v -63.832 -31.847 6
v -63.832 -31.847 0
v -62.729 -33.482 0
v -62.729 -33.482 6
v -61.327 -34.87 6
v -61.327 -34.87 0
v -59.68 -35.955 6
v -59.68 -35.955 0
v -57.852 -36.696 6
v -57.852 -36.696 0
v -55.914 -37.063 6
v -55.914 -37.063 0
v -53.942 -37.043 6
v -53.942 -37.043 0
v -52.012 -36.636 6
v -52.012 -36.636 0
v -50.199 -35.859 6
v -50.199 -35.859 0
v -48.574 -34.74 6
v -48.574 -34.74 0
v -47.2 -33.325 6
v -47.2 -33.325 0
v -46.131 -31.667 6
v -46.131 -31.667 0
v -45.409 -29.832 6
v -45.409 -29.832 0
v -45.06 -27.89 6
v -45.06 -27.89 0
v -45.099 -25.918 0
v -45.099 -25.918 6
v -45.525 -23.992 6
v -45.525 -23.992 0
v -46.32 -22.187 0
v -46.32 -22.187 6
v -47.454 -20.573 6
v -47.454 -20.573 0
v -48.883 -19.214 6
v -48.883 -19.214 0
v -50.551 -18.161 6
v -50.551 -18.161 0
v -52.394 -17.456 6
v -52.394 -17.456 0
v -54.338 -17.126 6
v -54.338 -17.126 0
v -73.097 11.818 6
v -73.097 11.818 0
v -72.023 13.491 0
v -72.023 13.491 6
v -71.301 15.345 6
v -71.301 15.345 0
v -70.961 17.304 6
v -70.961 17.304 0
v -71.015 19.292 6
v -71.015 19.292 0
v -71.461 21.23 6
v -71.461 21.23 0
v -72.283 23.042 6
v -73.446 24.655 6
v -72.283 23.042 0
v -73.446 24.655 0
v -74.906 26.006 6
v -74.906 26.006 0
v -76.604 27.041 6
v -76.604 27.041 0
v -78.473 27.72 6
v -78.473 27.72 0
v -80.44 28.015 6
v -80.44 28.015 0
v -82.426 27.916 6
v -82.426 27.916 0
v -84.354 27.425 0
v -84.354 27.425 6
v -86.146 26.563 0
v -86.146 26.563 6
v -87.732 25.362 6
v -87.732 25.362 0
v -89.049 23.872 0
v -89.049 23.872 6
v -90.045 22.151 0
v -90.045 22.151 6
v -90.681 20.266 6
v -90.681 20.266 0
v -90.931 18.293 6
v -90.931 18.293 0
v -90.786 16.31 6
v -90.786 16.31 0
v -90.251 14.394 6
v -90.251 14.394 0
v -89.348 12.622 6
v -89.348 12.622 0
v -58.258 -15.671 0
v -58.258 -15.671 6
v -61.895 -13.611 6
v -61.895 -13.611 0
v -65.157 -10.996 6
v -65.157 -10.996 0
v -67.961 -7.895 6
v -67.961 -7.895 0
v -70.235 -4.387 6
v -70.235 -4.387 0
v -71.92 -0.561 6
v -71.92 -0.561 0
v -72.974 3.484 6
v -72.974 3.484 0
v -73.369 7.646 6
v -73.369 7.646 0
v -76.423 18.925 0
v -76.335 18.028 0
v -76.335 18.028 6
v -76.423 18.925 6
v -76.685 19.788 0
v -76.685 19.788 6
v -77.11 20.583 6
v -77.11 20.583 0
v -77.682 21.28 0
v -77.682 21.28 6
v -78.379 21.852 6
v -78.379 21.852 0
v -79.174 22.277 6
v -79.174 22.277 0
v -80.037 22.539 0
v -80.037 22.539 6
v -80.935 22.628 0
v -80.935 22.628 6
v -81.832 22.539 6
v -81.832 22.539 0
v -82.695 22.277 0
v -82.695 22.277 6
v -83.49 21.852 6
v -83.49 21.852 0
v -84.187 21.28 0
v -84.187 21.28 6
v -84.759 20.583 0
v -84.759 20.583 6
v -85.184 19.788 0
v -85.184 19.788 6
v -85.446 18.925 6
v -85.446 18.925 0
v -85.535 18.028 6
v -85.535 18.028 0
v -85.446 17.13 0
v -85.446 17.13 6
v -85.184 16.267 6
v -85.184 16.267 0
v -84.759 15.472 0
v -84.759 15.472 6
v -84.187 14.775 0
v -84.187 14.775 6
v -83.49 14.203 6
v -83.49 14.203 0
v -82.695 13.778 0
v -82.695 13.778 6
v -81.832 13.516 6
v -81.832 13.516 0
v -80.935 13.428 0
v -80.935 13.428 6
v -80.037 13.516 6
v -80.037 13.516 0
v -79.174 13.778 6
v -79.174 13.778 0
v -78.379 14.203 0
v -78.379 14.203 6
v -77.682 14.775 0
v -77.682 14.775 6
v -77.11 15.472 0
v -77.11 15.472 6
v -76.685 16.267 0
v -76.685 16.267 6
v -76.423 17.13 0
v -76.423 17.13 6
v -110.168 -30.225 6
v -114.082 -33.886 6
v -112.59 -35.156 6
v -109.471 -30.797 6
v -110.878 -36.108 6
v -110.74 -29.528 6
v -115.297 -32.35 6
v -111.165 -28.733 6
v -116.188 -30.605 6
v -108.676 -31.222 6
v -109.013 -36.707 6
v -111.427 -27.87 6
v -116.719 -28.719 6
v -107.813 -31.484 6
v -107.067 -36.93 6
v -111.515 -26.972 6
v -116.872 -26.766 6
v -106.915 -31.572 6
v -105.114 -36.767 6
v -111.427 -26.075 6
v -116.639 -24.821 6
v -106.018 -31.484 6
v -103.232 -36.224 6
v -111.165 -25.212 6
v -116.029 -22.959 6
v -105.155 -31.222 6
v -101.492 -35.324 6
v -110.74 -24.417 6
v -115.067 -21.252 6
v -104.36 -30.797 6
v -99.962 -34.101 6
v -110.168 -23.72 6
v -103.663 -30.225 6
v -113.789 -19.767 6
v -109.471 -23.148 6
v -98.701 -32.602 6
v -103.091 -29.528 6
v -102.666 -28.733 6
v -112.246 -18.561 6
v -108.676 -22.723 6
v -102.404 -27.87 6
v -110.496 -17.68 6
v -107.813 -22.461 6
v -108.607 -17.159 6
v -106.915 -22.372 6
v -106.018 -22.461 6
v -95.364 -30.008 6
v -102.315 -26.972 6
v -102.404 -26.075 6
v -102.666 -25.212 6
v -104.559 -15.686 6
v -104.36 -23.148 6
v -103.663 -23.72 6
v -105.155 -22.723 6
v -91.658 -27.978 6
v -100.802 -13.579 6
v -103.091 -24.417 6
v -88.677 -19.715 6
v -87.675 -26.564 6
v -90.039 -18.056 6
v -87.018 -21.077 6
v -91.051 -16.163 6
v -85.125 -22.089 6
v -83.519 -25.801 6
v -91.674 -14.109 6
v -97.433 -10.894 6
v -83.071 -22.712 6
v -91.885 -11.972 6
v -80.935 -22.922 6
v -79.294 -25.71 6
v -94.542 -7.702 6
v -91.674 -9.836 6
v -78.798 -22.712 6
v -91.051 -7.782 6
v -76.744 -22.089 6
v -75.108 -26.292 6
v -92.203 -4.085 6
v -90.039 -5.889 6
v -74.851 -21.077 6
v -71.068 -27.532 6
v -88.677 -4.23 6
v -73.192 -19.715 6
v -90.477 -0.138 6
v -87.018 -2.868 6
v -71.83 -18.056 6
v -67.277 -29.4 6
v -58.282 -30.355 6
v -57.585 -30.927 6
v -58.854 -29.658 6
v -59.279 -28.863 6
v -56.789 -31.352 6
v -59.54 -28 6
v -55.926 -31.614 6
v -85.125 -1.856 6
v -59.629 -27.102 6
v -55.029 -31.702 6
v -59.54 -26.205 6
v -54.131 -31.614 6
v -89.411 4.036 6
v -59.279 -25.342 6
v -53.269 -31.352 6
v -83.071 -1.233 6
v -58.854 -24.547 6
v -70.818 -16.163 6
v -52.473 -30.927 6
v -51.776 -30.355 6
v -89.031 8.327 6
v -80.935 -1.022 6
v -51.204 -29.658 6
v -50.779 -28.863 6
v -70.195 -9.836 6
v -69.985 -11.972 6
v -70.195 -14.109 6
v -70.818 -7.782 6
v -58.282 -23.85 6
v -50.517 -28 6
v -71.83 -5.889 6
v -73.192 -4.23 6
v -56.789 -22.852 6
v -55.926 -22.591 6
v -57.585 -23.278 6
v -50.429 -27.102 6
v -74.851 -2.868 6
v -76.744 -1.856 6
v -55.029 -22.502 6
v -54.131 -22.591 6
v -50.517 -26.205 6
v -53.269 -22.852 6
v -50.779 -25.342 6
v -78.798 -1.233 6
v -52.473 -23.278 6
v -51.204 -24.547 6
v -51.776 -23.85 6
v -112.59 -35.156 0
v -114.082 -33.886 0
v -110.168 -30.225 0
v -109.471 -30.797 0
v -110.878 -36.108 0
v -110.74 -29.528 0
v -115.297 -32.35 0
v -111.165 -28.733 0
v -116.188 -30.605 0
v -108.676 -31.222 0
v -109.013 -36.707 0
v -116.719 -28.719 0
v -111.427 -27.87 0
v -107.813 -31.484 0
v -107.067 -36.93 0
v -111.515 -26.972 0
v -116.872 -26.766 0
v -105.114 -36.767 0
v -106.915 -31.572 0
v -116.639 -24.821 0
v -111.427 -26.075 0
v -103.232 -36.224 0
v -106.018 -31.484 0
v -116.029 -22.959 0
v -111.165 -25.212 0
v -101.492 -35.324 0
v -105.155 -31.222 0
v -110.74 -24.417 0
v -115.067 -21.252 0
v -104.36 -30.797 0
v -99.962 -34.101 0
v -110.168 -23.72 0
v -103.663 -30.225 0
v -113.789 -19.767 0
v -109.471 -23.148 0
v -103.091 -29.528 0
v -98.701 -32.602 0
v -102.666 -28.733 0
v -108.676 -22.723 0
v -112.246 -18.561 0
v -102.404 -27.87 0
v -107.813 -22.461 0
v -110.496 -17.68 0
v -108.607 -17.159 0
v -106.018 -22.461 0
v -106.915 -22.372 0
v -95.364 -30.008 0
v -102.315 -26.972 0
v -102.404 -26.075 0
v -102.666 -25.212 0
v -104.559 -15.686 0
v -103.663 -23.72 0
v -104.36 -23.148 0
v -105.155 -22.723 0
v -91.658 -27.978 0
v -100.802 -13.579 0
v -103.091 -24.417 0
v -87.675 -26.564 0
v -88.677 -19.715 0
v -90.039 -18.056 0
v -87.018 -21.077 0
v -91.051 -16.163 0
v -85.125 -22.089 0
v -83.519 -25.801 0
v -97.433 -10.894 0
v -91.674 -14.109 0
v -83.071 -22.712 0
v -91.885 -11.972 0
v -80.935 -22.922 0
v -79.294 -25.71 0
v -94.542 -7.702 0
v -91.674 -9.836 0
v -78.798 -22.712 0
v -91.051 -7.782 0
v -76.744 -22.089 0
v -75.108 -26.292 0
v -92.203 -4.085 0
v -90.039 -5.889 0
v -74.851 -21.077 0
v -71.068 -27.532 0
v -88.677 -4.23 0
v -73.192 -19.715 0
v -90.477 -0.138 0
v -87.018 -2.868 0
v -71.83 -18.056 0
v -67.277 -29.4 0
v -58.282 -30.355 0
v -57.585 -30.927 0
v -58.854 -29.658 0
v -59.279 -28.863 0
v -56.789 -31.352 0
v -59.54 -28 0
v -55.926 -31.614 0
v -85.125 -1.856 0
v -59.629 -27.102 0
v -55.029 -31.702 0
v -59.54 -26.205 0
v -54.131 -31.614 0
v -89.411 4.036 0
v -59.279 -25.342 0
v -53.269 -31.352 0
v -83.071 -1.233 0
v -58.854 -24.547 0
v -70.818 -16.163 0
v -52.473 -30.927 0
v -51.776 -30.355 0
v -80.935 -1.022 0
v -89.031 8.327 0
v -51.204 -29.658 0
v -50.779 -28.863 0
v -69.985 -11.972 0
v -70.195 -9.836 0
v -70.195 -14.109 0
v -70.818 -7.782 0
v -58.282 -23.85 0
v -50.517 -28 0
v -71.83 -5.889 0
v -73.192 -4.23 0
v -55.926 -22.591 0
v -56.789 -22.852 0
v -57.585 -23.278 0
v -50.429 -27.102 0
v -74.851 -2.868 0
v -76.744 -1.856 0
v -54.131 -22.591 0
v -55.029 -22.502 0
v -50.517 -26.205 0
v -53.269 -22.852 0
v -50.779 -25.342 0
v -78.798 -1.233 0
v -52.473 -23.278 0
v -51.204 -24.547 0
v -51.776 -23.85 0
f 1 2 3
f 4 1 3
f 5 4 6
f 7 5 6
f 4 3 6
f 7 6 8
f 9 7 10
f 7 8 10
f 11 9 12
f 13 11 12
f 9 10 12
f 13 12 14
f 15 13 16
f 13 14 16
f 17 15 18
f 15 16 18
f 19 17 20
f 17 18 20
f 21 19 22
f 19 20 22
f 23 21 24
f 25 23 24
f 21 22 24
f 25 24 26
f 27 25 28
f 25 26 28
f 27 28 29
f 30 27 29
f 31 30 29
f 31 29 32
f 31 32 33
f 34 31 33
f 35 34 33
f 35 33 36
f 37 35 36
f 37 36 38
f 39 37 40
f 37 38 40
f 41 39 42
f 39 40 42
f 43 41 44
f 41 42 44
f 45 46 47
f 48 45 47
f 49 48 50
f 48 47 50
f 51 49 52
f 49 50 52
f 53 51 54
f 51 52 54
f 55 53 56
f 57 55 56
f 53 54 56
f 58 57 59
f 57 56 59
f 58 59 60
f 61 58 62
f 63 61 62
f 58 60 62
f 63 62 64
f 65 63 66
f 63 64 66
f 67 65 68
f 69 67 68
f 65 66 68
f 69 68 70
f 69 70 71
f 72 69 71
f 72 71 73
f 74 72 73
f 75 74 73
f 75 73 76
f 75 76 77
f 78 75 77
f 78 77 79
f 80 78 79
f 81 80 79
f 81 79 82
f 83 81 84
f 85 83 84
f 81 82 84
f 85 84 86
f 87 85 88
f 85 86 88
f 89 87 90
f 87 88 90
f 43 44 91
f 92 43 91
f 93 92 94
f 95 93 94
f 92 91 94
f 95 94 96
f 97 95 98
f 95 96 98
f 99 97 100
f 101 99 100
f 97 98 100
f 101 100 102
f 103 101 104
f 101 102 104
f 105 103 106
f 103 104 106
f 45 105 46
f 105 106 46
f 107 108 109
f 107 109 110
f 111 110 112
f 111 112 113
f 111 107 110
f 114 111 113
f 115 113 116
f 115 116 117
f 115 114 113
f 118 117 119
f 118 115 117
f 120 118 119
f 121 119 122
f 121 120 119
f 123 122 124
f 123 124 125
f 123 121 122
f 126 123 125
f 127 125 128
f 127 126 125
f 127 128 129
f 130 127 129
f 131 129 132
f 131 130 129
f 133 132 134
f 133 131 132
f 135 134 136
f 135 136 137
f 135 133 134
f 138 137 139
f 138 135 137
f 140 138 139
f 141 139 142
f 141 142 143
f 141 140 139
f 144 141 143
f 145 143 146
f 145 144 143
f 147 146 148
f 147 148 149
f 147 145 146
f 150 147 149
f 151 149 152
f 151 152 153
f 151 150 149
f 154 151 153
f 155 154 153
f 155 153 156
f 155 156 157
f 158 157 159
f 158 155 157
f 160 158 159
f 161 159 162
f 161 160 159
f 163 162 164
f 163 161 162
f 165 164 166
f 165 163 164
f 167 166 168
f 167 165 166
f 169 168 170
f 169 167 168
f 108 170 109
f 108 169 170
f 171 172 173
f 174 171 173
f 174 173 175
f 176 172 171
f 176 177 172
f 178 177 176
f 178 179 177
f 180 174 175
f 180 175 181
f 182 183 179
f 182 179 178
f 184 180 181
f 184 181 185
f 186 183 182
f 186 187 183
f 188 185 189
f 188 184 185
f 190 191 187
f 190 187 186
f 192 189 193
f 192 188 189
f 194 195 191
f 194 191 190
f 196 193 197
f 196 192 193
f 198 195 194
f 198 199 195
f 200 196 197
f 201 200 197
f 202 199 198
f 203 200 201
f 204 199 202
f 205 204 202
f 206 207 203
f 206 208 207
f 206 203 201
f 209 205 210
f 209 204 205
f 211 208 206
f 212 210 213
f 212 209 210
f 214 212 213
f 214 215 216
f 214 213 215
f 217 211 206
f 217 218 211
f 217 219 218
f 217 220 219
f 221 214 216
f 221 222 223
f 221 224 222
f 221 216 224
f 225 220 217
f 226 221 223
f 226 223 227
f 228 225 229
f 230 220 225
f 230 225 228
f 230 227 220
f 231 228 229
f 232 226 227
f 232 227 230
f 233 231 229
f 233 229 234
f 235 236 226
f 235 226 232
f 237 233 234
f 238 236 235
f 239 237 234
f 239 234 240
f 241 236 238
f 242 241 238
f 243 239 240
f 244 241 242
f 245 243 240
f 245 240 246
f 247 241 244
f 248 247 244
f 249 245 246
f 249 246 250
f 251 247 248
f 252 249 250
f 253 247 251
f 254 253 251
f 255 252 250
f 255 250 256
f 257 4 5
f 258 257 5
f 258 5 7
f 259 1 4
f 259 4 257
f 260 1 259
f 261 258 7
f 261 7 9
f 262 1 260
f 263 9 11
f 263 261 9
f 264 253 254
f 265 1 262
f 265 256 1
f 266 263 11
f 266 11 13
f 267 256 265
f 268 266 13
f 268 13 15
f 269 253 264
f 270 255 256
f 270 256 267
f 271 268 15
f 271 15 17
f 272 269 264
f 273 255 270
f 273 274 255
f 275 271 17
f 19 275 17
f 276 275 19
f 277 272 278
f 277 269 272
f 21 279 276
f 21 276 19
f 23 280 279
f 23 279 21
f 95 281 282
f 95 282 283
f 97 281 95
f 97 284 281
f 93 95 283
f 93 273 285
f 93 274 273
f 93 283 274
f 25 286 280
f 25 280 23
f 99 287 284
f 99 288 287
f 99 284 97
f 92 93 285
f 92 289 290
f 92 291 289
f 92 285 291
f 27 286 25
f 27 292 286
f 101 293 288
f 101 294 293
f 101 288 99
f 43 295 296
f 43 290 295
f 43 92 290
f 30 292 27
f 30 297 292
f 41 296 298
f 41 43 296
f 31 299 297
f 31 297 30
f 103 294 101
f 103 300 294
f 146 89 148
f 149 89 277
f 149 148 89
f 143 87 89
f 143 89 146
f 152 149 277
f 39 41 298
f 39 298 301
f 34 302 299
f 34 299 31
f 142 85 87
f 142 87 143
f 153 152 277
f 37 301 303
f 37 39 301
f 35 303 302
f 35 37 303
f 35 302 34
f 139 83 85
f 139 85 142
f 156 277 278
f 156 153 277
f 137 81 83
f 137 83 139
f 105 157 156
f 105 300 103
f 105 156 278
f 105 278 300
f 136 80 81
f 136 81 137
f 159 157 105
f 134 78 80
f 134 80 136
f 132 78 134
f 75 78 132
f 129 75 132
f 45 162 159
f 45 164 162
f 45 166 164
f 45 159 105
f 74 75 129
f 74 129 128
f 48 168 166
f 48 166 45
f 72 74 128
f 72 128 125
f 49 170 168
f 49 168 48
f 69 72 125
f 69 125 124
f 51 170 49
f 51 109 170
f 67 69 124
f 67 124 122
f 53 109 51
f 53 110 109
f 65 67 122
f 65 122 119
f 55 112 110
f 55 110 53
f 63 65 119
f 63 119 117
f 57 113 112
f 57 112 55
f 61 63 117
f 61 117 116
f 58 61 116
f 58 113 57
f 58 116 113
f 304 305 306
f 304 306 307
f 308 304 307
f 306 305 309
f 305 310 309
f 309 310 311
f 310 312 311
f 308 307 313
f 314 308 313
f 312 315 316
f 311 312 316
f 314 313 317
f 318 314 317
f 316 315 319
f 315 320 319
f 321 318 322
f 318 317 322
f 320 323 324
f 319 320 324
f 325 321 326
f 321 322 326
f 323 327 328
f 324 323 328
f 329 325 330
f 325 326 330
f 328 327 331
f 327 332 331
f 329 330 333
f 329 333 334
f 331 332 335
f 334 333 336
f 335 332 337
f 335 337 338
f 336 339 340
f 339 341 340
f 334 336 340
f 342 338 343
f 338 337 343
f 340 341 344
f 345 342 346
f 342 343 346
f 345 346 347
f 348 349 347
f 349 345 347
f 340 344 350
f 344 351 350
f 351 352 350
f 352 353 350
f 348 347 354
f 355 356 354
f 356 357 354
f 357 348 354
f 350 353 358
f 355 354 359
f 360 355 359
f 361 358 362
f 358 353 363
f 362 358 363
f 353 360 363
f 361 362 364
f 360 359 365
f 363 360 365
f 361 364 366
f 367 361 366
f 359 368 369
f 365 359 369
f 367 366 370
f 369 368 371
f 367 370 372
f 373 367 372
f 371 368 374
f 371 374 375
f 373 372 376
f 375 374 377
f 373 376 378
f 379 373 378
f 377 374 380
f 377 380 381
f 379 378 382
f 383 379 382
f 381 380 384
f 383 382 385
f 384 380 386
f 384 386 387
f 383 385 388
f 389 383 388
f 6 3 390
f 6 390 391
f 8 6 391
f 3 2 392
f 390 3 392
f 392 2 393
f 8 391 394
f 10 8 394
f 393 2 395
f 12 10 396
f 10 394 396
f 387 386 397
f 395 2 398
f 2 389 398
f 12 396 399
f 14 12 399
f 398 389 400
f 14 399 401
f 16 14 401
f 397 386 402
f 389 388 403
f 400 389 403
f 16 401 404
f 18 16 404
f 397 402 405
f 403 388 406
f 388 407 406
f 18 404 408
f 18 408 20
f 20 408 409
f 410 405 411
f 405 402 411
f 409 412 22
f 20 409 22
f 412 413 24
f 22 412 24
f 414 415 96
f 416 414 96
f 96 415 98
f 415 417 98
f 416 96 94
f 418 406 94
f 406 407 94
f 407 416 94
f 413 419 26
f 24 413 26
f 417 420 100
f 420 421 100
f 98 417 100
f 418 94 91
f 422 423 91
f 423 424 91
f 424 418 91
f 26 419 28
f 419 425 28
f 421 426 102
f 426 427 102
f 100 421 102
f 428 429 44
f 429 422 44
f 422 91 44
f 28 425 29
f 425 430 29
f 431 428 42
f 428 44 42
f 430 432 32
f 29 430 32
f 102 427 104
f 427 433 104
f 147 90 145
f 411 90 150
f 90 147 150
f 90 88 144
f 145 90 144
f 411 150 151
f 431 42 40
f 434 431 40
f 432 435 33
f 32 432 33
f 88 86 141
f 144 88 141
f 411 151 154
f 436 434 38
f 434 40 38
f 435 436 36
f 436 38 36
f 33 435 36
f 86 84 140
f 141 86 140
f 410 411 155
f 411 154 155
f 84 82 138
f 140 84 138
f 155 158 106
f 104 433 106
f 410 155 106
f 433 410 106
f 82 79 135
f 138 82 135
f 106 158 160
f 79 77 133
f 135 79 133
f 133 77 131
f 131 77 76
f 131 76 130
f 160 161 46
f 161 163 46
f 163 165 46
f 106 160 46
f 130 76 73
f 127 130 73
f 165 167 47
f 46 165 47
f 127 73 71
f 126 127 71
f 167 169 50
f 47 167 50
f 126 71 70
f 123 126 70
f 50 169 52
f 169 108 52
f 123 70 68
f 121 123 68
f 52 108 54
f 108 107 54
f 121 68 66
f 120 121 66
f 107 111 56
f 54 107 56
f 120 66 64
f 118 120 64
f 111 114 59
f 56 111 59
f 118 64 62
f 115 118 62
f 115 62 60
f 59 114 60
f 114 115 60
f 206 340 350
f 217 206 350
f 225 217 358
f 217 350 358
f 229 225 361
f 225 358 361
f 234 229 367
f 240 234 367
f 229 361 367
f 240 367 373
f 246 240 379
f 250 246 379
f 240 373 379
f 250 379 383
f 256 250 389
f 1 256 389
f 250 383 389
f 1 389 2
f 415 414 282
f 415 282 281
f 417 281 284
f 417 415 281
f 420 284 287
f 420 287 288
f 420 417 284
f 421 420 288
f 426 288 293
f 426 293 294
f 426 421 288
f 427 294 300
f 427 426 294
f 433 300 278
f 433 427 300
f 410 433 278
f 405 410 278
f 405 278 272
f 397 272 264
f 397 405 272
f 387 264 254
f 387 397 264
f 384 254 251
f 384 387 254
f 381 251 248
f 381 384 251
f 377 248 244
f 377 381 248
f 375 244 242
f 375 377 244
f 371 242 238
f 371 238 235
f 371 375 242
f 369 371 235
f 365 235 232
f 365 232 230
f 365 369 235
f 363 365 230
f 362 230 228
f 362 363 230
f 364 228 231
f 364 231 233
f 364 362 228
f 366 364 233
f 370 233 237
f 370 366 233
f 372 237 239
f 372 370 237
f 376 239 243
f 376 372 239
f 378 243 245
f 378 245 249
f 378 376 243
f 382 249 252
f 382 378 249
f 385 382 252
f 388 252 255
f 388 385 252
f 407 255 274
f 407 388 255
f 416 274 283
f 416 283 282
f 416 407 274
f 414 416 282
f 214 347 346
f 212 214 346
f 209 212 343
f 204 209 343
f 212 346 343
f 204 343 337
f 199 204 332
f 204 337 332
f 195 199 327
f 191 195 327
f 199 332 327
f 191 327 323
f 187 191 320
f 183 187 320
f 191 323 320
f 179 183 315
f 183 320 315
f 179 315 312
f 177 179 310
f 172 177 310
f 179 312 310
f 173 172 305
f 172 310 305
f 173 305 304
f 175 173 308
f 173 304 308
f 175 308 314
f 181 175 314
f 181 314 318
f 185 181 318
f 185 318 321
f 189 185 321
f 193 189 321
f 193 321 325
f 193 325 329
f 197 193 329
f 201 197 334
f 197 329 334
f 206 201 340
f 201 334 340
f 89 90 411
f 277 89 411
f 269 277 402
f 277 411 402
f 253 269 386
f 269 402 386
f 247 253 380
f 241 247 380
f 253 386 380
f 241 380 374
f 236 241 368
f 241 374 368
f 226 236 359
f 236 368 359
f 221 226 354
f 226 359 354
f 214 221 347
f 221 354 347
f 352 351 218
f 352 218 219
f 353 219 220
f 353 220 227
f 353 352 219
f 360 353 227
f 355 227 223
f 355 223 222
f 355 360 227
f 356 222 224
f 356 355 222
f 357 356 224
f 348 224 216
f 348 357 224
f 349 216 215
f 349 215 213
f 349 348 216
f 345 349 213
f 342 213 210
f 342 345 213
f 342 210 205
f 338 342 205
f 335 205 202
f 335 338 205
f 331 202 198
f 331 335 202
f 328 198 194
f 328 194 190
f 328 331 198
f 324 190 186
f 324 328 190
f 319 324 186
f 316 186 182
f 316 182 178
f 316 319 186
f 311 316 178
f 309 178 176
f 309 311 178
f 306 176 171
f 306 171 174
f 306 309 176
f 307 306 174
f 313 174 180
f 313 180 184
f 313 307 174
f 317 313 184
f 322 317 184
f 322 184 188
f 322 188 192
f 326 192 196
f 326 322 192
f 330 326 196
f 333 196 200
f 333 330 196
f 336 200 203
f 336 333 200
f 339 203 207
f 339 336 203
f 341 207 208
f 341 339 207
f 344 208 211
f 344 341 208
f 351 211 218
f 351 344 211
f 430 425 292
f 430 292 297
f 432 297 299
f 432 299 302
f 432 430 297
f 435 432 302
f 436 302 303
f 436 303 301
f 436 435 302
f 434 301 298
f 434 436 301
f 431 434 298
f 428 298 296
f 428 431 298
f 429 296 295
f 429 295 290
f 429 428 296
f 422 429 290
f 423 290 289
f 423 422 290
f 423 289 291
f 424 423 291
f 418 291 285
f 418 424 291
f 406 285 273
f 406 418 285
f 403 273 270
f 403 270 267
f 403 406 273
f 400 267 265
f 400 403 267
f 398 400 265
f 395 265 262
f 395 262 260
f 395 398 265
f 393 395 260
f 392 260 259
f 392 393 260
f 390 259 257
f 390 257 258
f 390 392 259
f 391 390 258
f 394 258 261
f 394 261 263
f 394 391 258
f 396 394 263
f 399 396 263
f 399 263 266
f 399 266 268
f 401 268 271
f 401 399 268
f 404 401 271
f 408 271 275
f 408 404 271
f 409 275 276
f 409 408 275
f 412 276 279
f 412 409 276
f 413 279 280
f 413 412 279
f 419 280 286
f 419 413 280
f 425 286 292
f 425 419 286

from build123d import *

# Parameters (mm, degrees)
F0_R     = 4.6
F0_R_2   = 10.95
F1_DEPTH = 6


with BuildPart() as f1:
    # F0 (on Top) → F1 (new body)
    with BuildSketch(Plane.XY):
        with BuildLine():
            ThreePointArc((-54.33825, -17.126217), (-69.16794, -6.186809), (-73.096568, 11.817531))
            ThreePointArc((-73.096568, 11.817531), (-80.439934, 28.01532), (-89.348044, 12.622498))
            ThreePointArc((-89.348044, 12.622498), (-93.298938, -5.940555), (-108.607333, -17.158822))
            ThreePointArc((-108.607333, -17.158822), (-115.297331, -32.349517), (-98.700652, -32.601591))
            ThreePointArc((-98.700652, -32.601591), (-81.408097, -25.671054), (-63.831793, -31.846683))
            ThreePointArc((-63.831793, -31.846683), (-46.625, -32.522185), (-54.33825, -17.126217))
        make_face()
        with Locations((-106.915409, -26.972435)):
            Circle(F0_R, mode=Mode.SUBTRACT)
        with Locations((-55.028885, -27.102339)):
            Circle(F0_R, mode=Mode.SUBTRACT)
        with Locations((-80.934647, -11.972435)):
            Circle(F0_R_2, mode=Mode.SUBTRACT)
        with Locations((-80.934647, 18.027565)):
            Circle(F0_R, mode=Mode.SUBTRACT)
    extrude(amount=F1_DEPTH)


solid = f1.part
